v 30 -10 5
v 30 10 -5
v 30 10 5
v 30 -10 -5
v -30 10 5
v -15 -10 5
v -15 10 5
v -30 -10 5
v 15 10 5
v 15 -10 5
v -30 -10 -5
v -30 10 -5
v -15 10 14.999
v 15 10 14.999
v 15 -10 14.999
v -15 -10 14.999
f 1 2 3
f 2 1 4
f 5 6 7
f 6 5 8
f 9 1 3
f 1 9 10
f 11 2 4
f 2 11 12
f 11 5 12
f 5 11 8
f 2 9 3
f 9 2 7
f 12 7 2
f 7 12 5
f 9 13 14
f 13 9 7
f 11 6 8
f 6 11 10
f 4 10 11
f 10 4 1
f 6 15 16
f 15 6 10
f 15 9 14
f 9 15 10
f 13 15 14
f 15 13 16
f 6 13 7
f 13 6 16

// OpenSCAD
cube([60,20,10],center=true);
translate([0,0,10-0.001])
cube([30,20,10],center=true);
